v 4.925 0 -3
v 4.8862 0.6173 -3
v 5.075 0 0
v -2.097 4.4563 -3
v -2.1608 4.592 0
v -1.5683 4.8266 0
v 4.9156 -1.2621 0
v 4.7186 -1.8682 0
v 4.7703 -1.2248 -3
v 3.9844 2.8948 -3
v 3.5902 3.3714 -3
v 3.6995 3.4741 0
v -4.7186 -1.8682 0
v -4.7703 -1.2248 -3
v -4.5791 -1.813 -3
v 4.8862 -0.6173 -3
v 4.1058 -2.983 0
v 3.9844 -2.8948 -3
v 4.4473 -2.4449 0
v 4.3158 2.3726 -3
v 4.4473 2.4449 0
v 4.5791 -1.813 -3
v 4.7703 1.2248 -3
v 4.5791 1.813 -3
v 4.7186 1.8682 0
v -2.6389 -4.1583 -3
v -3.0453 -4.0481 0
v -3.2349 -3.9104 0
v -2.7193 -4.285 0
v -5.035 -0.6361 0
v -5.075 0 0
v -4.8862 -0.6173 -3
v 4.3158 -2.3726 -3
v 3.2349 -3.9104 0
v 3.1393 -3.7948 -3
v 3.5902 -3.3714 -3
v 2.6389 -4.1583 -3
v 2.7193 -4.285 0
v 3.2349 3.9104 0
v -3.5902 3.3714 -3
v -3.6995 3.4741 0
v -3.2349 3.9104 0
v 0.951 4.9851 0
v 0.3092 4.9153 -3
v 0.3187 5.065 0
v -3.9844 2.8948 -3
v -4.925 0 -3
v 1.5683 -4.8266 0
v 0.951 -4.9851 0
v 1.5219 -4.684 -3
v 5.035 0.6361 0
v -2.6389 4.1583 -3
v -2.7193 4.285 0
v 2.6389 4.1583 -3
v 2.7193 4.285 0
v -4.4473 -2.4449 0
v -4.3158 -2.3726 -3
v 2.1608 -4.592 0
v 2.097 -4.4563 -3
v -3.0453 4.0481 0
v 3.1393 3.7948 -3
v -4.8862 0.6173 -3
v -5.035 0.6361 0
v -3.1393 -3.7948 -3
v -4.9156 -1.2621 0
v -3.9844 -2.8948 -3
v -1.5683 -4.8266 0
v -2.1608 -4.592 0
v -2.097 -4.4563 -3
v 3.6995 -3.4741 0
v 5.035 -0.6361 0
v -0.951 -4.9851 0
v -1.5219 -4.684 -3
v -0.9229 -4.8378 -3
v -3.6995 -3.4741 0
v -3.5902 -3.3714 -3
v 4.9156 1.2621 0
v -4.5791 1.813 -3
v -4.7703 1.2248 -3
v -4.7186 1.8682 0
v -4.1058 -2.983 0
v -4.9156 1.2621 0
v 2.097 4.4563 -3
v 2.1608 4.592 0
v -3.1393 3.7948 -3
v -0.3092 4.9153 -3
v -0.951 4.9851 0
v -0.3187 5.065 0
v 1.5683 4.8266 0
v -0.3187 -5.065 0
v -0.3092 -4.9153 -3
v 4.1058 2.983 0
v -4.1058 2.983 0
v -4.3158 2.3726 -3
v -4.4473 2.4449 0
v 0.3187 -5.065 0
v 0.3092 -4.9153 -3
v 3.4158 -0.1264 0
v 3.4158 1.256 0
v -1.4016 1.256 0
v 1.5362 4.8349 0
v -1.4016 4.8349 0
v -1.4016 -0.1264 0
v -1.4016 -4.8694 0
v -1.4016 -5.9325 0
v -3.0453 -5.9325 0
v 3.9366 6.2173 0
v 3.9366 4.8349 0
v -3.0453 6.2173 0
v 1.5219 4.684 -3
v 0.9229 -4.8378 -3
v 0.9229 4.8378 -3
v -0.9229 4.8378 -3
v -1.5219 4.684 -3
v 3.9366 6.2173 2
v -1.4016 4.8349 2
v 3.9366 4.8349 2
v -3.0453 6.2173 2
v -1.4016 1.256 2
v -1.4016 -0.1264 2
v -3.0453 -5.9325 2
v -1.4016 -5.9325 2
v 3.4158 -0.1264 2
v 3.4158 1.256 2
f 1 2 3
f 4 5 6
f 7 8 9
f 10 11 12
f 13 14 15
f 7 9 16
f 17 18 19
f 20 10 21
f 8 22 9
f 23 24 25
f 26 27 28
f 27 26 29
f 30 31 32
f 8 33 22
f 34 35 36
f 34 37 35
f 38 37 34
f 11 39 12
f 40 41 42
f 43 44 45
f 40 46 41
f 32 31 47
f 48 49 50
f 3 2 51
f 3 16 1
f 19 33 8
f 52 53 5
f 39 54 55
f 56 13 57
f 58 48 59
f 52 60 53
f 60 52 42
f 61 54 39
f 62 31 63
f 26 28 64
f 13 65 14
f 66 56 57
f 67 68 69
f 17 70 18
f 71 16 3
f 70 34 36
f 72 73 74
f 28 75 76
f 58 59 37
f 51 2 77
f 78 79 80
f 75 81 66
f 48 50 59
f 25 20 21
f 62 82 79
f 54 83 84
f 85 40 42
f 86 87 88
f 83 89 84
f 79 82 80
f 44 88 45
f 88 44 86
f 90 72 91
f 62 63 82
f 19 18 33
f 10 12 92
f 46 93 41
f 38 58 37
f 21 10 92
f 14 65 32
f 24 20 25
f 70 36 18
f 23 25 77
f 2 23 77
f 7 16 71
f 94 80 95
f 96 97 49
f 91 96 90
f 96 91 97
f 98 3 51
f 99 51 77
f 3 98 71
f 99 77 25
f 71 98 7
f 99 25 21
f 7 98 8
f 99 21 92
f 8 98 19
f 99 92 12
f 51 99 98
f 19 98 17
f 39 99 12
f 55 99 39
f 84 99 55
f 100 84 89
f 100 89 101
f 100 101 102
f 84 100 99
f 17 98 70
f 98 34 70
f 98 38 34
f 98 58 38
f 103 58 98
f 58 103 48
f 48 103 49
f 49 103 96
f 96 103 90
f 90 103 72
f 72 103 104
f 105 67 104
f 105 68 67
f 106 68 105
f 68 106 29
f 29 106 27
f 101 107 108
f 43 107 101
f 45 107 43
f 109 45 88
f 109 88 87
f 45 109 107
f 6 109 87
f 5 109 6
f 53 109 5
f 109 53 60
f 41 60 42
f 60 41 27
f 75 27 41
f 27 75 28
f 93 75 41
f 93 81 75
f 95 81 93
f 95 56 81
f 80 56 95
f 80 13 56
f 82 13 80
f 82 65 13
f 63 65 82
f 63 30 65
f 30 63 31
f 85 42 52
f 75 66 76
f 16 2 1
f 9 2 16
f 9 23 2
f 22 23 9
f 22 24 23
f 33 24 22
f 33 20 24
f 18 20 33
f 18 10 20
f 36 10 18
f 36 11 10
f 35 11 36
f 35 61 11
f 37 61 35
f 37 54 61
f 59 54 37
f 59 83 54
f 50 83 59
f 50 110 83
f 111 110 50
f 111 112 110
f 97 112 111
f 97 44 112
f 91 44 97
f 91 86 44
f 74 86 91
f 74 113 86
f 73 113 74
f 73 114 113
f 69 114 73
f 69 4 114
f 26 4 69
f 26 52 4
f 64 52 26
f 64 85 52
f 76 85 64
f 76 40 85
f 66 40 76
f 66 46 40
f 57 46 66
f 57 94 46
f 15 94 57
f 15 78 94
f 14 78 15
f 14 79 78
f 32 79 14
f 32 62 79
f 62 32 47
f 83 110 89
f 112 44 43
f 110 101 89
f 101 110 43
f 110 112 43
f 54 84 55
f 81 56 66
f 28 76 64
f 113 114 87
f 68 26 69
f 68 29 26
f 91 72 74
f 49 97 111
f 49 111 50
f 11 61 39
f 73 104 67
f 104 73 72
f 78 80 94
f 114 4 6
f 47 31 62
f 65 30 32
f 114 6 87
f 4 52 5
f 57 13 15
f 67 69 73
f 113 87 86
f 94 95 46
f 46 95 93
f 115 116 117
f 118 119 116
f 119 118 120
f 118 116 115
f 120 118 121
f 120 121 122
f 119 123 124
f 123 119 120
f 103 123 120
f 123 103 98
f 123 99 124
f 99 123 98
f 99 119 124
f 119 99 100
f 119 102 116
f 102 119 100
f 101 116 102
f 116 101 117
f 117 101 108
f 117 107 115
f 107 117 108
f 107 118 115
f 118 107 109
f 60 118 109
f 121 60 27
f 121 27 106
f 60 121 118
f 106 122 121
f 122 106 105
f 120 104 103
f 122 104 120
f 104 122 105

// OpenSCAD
$fn = 50;


difference() {
	union() {
		translate(v = [0, 0, -3.0000000000]) {
			cylinder(h = 3, r1 = 4.9250000000, r2 = 5.0750000000);
		}
		linear_extrude(height = 2) {
			text(font = "Impact", halign = "center", size = 12, text = "F", valign = "center");
		}
	}
	union();
}
